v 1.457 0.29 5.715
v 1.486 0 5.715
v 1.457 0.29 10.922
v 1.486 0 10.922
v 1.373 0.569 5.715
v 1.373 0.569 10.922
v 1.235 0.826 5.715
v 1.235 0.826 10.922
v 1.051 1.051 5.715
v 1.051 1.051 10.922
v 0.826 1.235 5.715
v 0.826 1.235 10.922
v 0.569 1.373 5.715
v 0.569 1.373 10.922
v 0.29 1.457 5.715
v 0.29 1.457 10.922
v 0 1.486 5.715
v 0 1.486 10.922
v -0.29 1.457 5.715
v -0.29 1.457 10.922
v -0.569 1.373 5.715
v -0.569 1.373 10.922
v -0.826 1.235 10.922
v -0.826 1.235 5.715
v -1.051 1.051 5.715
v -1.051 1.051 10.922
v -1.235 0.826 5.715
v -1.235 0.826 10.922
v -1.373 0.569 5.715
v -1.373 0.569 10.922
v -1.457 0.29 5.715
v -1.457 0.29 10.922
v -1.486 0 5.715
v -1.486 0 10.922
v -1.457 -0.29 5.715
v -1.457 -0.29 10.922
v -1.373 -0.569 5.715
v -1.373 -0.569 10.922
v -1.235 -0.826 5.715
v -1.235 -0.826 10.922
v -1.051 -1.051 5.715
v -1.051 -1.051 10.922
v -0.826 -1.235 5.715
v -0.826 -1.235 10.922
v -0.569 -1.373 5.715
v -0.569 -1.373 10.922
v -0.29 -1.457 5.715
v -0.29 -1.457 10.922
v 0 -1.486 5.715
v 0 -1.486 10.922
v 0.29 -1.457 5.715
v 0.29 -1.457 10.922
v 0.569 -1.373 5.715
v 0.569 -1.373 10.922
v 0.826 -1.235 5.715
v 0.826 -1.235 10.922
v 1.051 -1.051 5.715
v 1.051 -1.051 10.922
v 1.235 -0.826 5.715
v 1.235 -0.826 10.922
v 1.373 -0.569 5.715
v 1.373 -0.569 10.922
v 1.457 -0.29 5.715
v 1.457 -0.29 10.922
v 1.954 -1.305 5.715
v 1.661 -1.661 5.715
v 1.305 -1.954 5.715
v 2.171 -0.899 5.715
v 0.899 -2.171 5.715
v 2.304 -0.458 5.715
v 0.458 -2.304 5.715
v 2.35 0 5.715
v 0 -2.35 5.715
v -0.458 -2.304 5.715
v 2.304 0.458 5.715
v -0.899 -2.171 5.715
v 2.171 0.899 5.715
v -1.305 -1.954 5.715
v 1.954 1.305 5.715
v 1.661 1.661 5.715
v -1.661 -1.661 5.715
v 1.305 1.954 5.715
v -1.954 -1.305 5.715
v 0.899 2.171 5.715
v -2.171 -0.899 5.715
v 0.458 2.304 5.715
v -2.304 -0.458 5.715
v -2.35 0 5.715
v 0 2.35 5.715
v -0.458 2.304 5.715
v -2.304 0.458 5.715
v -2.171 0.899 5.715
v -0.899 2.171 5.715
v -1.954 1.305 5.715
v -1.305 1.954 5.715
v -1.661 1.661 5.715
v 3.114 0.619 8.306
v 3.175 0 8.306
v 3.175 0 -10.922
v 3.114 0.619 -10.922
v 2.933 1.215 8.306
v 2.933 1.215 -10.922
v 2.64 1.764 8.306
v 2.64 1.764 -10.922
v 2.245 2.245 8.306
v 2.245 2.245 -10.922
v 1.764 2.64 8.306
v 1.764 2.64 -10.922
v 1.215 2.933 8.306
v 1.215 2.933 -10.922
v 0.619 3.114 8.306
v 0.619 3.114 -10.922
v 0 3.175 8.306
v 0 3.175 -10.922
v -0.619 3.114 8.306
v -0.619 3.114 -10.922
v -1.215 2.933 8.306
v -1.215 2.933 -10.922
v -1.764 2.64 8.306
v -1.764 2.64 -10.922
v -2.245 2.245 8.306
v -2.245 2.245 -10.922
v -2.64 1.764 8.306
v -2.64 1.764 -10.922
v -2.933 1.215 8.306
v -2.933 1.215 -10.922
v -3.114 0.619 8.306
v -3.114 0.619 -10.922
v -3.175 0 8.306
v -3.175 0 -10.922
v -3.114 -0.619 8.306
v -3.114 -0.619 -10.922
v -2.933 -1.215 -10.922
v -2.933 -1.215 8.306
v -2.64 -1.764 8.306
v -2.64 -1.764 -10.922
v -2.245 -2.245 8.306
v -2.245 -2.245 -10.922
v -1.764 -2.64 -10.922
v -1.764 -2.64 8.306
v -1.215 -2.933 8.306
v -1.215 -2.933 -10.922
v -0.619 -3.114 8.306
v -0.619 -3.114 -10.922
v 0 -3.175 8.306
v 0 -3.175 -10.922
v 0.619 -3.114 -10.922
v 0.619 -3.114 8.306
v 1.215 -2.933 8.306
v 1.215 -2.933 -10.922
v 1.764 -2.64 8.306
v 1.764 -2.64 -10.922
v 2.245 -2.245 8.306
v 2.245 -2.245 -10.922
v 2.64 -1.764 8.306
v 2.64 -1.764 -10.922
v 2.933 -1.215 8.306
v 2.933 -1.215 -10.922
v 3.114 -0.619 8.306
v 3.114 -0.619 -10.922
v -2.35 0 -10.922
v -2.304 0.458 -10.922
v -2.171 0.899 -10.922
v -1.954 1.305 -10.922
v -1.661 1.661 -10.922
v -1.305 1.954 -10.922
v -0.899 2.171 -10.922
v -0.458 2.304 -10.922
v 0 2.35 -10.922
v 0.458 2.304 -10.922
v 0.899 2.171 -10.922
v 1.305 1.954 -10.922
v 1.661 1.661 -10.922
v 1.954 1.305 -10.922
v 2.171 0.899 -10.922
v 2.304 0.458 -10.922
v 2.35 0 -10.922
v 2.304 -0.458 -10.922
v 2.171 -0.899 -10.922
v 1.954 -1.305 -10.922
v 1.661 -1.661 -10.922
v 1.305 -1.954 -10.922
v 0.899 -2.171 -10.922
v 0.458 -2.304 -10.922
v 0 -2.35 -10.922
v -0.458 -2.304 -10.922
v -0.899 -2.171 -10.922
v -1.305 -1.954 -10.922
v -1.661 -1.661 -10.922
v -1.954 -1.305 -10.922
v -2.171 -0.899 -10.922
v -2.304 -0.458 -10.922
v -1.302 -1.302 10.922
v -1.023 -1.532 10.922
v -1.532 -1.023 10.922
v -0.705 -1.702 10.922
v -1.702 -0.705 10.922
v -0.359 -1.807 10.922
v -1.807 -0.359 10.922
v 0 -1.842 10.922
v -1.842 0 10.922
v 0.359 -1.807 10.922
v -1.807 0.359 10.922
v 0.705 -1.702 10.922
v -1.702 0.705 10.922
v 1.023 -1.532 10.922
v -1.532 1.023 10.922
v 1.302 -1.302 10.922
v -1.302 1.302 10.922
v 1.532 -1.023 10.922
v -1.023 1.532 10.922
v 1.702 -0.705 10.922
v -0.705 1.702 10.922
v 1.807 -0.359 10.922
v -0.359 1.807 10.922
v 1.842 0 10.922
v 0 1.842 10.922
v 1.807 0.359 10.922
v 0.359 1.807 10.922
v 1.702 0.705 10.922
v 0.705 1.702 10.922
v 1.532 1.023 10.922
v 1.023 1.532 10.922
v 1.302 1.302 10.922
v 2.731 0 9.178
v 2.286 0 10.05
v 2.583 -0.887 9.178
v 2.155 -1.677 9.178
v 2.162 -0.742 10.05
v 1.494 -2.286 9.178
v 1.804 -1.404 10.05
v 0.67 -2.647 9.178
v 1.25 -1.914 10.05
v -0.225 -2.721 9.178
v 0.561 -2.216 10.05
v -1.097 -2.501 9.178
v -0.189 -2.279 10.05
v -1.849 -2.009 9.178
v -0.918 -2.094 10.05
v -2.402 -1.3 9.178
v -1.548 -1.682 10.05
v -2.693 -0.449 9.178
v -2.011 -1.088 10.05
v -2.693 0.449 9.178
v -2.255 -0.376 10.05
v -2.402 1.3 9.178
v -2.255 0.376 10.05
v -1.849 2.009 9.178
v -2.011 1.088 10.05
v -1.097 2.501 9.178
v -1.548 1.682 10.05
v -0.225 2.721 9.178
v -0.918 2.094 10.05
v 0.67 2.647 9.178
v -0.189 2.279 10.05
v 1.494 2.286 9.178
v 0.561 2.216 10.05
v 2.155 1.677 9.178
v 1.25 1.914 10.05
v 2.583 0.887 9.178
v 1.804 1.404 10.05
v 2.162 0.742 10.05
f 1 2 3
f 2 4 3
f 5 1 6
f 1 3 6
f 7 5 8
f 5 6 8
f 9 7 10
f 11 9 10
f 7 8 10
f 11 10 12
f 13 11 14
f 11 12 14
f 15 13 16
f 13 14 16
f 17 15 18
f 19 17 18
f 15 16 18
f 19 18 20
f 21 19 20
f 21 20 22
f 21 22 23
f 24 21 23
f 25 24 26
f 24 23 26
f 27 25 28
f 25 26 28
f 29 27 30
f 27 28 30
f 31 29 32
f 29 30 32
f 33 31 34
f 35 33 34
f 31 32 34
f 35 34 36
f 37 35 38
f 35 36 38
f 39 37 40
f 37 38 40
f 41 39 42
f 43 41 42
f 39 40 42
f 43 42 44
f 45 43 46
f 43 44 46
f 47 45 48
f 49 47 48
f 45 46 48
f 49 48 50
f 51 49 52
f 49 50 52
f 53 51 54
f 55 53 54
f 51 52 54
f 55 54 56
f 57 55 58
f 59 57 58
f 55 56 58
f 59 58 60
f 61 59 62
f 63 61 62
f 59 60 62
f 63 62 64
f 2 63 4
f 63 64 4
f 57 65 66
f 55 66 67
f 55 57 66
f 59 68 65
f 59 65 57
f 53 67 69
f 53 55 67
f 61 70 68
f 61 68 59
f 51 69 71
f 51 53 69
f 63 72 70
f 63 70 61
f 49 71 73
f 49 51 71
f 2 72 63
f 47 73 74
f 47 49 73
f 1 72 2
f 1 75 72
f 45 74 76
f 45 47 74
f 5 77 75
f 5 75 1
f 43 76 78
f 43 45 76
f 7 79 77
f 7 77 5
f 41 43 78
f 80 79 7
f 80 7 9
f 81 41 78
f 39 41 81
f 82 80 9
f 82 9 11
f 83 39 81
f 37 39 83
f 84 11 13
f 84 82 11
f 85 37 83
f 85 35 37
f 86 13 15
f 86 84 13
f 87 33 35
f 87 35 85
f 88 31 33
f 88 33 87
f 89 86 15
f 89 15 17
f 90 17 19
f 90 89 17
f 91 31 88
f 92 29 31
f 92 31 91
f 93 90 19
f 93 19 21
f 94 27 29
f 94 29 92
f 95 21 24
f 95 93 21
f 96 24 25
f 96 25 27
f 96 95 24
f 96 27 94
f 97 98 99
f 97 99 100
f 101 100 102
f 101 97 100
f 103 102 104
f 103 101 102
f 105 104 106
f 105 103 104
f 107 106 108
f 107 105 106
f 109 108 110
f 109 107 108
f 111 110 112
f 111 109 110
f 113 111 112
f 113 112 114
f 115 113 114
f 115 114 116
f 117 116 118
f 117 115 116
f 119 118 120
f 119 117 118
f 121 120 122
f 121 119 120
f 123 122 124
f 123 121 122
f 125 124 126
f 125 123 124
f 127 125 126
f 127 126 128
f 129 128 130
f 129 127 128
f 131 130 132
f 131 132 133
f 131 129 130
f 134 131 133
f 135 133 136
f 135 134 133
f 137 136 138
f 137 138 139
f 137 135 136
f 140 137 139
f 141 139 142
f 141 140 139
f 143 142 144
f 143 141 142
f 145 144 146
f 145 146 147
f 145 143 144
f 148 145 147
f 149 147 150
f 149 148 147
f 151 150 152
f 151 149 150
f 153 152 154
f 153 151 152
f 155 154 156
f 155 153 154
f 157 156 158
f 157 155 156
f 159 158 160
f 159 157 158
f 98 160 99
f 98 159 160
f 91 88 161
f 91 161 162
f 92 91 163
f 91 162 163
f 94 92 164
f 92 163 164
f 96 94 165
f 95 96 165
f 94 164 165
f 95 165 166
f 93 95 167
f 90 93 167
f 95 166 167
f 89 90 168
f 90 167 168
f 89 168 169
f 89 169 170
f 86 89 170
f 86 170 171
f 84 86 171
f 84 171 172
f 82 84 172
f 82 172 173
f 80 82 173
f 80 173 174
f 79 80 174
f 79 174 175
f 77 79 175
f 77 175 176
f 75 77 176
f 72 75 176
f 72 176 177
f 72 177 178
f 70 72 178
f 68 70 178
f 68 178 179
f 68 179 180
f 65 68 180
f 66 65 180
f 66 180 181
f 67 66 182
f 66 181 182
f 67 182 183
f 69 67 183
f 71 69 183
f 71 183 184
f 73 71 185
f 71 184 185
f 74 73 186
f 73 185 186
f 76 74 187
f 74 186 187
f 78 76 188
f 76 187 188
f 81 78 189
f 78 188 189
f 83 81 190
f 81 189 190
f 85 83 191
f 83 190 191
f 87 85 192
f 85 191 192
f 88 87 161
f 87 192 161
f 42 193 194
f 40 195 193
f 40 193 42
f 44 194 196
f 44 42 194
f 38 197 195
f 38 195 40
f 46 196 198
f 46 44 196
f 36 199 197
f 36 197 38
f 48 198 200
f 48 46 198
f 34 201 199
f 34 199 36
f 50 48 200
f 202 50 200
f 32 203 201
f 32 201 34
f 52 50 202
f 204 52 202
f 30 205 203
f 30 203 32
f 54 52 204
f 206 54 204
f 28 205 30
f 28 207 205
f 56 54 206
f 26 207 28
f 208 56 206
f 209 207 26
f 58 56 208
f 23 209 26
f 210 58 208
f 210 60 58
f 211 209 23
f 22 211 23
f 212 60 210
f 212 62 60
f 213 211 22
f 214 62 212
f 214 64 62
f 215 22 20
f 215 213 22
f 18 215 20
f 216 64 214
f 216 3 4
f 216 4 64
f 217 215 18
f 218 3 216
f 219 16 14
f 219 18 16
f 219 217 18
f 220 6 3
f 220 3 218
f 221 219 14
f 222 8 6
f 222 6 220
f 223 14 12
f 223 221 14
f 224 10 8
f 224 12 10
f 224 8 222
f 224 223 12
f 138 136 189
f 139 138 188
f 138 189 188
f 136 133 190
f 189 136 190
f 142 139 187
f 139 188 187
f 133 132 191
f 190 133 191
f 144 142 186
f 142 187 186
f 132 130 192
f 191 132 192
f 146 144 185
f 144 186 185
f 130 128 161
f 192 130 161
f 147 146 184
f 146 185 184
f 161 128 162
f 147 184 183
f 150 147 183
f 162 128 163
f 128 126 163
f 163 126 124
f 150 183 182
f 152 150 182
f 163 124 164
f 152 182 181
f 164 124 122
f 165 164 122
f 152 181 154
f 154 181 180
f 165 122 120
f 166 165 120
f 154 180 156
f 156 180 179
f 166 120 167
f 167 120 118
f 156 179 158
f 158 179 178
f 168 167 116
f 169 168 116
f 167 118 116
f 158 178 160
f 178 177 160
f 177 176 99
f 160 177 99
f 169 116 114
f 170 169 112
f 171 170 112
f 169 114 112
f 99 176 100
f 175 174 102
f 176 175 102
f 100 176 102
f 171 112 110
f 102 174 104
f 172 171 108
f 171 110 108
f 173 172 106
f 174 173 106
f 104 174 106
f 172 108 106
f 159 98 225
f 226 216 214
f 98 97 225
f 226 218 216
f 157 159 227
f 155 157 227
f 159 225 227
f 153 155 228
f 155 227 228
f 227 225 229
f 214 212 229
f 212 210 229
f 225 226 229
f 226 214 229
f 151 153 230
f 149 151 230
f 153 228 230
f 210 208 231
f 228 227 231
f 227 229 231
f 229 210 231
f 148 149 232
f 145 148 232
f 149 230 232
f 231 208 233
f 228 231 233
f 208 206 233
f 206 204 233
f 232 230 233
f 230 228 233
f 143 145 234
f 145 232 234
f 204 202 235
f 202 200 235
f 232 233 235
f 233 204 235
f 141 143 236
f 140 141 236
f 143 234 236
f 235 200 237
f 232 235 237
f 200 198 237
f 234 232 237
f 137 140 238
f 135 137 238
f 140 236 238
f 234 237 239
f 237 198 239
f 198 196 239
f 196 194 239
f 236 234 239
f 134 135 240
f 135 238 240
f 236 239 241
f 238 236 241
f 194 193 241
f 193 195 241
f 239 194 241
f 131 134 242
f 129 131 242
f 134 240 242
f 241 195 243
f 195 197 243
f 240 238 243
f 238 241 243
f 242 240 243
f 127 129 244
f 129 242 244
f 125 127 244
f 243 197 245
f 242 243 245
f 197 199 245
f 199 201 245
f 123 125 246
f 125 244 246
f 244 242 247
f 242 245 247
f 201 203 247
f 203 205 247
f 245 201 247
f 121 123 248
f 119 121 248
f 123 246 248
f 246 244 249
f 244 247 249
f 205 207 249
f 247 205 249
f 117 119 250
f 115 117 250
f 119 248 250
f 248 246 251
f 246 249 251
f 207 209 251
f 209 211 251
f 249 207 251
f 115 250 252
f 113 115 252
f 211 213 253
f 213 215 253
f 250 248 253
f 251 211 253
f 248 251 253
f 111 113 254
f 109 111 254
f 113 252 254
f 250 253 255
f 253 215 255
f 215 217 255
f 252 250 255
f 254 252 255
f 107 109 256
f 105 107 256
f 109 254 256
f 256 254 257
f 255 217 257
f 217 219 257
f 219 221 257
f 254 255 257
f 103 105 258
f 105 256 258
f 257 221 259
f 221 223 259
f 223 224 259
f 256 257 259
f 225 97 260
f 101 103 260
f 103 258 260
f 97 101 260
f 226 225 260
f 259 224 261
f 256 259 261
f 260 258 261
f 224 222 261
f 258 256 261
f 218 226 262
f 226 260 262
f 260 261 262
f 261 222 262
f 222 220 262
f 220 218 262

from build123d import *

# Parameters (mm, degrees)
CROQUIS3_R                                           = 3.175
SALIENTE_EXTRUIR2_DEPTH                              = 10.922
REFRENTADO_PARA_TORNILLO_CON_CABEZA_HUEC_D           = 2.9718
REFRENTADO_PARA_TORNILLO_CON_CABEZA_HUEC_CBORE_D     = 4.699
REFRENTADO_PARA_TORNILLO_CON_CABEZA_HUEC_CBORE_DEPTH = 16.637


with BuildPart() as part:
    # Croquis3 → Saliente-Extruir2 (new, symmetric)
    with BuildSketch(Plane.XY):
        Circle(CROQUIS3_R)
    extrude(amount=SALIENTE_EXTRUIR2_DEPTH, both=True)

    # Refrentado para tornillo con cabeza hueca de 1/41 (through all)
    with Locations(Plane(origin=(0, 0, -10.922), x_dir=(-1, 0, 0), z_dir=(0, 0, -1))):
        with Locations((0, 0)):
            CounterBoreHole(REFRENTADO_PARA_TORNILLO_CON_CABEZA_HUEC_D / 2, REFRENTADO_PARA_TORNILLO_CON_CABEZA_HUEC_CBORE_D / 2, REFRENTADO_PARA_TORNILLO_CON_CABEZA_HUEC_CBORE_DEPTH)

    # Croquis7 → Cortar-Revolución1 (revolve, cut)
    with BuildSketch(Plane(origin=(0, 0, 0), x_dir=(1, 0, 0), z_dir=(0, 1, 0)), mode=Mode.PRIVATE) as cortar_revoluci_n1_sk:
        Polygon((-3.175, -8.3058), (-1.841979519, -10.922), (-3.175, -10.922), align=None)
    revolve(cortar_revoluci_n1_sk.sketch.rotate(Axis((0, 0, 10.922), (0, 0, -1)), 180), axis=Axis((0, 0, 10.922), (0, 0, -1)), mode=Mode.SUBTRACT)


solid = part.part
